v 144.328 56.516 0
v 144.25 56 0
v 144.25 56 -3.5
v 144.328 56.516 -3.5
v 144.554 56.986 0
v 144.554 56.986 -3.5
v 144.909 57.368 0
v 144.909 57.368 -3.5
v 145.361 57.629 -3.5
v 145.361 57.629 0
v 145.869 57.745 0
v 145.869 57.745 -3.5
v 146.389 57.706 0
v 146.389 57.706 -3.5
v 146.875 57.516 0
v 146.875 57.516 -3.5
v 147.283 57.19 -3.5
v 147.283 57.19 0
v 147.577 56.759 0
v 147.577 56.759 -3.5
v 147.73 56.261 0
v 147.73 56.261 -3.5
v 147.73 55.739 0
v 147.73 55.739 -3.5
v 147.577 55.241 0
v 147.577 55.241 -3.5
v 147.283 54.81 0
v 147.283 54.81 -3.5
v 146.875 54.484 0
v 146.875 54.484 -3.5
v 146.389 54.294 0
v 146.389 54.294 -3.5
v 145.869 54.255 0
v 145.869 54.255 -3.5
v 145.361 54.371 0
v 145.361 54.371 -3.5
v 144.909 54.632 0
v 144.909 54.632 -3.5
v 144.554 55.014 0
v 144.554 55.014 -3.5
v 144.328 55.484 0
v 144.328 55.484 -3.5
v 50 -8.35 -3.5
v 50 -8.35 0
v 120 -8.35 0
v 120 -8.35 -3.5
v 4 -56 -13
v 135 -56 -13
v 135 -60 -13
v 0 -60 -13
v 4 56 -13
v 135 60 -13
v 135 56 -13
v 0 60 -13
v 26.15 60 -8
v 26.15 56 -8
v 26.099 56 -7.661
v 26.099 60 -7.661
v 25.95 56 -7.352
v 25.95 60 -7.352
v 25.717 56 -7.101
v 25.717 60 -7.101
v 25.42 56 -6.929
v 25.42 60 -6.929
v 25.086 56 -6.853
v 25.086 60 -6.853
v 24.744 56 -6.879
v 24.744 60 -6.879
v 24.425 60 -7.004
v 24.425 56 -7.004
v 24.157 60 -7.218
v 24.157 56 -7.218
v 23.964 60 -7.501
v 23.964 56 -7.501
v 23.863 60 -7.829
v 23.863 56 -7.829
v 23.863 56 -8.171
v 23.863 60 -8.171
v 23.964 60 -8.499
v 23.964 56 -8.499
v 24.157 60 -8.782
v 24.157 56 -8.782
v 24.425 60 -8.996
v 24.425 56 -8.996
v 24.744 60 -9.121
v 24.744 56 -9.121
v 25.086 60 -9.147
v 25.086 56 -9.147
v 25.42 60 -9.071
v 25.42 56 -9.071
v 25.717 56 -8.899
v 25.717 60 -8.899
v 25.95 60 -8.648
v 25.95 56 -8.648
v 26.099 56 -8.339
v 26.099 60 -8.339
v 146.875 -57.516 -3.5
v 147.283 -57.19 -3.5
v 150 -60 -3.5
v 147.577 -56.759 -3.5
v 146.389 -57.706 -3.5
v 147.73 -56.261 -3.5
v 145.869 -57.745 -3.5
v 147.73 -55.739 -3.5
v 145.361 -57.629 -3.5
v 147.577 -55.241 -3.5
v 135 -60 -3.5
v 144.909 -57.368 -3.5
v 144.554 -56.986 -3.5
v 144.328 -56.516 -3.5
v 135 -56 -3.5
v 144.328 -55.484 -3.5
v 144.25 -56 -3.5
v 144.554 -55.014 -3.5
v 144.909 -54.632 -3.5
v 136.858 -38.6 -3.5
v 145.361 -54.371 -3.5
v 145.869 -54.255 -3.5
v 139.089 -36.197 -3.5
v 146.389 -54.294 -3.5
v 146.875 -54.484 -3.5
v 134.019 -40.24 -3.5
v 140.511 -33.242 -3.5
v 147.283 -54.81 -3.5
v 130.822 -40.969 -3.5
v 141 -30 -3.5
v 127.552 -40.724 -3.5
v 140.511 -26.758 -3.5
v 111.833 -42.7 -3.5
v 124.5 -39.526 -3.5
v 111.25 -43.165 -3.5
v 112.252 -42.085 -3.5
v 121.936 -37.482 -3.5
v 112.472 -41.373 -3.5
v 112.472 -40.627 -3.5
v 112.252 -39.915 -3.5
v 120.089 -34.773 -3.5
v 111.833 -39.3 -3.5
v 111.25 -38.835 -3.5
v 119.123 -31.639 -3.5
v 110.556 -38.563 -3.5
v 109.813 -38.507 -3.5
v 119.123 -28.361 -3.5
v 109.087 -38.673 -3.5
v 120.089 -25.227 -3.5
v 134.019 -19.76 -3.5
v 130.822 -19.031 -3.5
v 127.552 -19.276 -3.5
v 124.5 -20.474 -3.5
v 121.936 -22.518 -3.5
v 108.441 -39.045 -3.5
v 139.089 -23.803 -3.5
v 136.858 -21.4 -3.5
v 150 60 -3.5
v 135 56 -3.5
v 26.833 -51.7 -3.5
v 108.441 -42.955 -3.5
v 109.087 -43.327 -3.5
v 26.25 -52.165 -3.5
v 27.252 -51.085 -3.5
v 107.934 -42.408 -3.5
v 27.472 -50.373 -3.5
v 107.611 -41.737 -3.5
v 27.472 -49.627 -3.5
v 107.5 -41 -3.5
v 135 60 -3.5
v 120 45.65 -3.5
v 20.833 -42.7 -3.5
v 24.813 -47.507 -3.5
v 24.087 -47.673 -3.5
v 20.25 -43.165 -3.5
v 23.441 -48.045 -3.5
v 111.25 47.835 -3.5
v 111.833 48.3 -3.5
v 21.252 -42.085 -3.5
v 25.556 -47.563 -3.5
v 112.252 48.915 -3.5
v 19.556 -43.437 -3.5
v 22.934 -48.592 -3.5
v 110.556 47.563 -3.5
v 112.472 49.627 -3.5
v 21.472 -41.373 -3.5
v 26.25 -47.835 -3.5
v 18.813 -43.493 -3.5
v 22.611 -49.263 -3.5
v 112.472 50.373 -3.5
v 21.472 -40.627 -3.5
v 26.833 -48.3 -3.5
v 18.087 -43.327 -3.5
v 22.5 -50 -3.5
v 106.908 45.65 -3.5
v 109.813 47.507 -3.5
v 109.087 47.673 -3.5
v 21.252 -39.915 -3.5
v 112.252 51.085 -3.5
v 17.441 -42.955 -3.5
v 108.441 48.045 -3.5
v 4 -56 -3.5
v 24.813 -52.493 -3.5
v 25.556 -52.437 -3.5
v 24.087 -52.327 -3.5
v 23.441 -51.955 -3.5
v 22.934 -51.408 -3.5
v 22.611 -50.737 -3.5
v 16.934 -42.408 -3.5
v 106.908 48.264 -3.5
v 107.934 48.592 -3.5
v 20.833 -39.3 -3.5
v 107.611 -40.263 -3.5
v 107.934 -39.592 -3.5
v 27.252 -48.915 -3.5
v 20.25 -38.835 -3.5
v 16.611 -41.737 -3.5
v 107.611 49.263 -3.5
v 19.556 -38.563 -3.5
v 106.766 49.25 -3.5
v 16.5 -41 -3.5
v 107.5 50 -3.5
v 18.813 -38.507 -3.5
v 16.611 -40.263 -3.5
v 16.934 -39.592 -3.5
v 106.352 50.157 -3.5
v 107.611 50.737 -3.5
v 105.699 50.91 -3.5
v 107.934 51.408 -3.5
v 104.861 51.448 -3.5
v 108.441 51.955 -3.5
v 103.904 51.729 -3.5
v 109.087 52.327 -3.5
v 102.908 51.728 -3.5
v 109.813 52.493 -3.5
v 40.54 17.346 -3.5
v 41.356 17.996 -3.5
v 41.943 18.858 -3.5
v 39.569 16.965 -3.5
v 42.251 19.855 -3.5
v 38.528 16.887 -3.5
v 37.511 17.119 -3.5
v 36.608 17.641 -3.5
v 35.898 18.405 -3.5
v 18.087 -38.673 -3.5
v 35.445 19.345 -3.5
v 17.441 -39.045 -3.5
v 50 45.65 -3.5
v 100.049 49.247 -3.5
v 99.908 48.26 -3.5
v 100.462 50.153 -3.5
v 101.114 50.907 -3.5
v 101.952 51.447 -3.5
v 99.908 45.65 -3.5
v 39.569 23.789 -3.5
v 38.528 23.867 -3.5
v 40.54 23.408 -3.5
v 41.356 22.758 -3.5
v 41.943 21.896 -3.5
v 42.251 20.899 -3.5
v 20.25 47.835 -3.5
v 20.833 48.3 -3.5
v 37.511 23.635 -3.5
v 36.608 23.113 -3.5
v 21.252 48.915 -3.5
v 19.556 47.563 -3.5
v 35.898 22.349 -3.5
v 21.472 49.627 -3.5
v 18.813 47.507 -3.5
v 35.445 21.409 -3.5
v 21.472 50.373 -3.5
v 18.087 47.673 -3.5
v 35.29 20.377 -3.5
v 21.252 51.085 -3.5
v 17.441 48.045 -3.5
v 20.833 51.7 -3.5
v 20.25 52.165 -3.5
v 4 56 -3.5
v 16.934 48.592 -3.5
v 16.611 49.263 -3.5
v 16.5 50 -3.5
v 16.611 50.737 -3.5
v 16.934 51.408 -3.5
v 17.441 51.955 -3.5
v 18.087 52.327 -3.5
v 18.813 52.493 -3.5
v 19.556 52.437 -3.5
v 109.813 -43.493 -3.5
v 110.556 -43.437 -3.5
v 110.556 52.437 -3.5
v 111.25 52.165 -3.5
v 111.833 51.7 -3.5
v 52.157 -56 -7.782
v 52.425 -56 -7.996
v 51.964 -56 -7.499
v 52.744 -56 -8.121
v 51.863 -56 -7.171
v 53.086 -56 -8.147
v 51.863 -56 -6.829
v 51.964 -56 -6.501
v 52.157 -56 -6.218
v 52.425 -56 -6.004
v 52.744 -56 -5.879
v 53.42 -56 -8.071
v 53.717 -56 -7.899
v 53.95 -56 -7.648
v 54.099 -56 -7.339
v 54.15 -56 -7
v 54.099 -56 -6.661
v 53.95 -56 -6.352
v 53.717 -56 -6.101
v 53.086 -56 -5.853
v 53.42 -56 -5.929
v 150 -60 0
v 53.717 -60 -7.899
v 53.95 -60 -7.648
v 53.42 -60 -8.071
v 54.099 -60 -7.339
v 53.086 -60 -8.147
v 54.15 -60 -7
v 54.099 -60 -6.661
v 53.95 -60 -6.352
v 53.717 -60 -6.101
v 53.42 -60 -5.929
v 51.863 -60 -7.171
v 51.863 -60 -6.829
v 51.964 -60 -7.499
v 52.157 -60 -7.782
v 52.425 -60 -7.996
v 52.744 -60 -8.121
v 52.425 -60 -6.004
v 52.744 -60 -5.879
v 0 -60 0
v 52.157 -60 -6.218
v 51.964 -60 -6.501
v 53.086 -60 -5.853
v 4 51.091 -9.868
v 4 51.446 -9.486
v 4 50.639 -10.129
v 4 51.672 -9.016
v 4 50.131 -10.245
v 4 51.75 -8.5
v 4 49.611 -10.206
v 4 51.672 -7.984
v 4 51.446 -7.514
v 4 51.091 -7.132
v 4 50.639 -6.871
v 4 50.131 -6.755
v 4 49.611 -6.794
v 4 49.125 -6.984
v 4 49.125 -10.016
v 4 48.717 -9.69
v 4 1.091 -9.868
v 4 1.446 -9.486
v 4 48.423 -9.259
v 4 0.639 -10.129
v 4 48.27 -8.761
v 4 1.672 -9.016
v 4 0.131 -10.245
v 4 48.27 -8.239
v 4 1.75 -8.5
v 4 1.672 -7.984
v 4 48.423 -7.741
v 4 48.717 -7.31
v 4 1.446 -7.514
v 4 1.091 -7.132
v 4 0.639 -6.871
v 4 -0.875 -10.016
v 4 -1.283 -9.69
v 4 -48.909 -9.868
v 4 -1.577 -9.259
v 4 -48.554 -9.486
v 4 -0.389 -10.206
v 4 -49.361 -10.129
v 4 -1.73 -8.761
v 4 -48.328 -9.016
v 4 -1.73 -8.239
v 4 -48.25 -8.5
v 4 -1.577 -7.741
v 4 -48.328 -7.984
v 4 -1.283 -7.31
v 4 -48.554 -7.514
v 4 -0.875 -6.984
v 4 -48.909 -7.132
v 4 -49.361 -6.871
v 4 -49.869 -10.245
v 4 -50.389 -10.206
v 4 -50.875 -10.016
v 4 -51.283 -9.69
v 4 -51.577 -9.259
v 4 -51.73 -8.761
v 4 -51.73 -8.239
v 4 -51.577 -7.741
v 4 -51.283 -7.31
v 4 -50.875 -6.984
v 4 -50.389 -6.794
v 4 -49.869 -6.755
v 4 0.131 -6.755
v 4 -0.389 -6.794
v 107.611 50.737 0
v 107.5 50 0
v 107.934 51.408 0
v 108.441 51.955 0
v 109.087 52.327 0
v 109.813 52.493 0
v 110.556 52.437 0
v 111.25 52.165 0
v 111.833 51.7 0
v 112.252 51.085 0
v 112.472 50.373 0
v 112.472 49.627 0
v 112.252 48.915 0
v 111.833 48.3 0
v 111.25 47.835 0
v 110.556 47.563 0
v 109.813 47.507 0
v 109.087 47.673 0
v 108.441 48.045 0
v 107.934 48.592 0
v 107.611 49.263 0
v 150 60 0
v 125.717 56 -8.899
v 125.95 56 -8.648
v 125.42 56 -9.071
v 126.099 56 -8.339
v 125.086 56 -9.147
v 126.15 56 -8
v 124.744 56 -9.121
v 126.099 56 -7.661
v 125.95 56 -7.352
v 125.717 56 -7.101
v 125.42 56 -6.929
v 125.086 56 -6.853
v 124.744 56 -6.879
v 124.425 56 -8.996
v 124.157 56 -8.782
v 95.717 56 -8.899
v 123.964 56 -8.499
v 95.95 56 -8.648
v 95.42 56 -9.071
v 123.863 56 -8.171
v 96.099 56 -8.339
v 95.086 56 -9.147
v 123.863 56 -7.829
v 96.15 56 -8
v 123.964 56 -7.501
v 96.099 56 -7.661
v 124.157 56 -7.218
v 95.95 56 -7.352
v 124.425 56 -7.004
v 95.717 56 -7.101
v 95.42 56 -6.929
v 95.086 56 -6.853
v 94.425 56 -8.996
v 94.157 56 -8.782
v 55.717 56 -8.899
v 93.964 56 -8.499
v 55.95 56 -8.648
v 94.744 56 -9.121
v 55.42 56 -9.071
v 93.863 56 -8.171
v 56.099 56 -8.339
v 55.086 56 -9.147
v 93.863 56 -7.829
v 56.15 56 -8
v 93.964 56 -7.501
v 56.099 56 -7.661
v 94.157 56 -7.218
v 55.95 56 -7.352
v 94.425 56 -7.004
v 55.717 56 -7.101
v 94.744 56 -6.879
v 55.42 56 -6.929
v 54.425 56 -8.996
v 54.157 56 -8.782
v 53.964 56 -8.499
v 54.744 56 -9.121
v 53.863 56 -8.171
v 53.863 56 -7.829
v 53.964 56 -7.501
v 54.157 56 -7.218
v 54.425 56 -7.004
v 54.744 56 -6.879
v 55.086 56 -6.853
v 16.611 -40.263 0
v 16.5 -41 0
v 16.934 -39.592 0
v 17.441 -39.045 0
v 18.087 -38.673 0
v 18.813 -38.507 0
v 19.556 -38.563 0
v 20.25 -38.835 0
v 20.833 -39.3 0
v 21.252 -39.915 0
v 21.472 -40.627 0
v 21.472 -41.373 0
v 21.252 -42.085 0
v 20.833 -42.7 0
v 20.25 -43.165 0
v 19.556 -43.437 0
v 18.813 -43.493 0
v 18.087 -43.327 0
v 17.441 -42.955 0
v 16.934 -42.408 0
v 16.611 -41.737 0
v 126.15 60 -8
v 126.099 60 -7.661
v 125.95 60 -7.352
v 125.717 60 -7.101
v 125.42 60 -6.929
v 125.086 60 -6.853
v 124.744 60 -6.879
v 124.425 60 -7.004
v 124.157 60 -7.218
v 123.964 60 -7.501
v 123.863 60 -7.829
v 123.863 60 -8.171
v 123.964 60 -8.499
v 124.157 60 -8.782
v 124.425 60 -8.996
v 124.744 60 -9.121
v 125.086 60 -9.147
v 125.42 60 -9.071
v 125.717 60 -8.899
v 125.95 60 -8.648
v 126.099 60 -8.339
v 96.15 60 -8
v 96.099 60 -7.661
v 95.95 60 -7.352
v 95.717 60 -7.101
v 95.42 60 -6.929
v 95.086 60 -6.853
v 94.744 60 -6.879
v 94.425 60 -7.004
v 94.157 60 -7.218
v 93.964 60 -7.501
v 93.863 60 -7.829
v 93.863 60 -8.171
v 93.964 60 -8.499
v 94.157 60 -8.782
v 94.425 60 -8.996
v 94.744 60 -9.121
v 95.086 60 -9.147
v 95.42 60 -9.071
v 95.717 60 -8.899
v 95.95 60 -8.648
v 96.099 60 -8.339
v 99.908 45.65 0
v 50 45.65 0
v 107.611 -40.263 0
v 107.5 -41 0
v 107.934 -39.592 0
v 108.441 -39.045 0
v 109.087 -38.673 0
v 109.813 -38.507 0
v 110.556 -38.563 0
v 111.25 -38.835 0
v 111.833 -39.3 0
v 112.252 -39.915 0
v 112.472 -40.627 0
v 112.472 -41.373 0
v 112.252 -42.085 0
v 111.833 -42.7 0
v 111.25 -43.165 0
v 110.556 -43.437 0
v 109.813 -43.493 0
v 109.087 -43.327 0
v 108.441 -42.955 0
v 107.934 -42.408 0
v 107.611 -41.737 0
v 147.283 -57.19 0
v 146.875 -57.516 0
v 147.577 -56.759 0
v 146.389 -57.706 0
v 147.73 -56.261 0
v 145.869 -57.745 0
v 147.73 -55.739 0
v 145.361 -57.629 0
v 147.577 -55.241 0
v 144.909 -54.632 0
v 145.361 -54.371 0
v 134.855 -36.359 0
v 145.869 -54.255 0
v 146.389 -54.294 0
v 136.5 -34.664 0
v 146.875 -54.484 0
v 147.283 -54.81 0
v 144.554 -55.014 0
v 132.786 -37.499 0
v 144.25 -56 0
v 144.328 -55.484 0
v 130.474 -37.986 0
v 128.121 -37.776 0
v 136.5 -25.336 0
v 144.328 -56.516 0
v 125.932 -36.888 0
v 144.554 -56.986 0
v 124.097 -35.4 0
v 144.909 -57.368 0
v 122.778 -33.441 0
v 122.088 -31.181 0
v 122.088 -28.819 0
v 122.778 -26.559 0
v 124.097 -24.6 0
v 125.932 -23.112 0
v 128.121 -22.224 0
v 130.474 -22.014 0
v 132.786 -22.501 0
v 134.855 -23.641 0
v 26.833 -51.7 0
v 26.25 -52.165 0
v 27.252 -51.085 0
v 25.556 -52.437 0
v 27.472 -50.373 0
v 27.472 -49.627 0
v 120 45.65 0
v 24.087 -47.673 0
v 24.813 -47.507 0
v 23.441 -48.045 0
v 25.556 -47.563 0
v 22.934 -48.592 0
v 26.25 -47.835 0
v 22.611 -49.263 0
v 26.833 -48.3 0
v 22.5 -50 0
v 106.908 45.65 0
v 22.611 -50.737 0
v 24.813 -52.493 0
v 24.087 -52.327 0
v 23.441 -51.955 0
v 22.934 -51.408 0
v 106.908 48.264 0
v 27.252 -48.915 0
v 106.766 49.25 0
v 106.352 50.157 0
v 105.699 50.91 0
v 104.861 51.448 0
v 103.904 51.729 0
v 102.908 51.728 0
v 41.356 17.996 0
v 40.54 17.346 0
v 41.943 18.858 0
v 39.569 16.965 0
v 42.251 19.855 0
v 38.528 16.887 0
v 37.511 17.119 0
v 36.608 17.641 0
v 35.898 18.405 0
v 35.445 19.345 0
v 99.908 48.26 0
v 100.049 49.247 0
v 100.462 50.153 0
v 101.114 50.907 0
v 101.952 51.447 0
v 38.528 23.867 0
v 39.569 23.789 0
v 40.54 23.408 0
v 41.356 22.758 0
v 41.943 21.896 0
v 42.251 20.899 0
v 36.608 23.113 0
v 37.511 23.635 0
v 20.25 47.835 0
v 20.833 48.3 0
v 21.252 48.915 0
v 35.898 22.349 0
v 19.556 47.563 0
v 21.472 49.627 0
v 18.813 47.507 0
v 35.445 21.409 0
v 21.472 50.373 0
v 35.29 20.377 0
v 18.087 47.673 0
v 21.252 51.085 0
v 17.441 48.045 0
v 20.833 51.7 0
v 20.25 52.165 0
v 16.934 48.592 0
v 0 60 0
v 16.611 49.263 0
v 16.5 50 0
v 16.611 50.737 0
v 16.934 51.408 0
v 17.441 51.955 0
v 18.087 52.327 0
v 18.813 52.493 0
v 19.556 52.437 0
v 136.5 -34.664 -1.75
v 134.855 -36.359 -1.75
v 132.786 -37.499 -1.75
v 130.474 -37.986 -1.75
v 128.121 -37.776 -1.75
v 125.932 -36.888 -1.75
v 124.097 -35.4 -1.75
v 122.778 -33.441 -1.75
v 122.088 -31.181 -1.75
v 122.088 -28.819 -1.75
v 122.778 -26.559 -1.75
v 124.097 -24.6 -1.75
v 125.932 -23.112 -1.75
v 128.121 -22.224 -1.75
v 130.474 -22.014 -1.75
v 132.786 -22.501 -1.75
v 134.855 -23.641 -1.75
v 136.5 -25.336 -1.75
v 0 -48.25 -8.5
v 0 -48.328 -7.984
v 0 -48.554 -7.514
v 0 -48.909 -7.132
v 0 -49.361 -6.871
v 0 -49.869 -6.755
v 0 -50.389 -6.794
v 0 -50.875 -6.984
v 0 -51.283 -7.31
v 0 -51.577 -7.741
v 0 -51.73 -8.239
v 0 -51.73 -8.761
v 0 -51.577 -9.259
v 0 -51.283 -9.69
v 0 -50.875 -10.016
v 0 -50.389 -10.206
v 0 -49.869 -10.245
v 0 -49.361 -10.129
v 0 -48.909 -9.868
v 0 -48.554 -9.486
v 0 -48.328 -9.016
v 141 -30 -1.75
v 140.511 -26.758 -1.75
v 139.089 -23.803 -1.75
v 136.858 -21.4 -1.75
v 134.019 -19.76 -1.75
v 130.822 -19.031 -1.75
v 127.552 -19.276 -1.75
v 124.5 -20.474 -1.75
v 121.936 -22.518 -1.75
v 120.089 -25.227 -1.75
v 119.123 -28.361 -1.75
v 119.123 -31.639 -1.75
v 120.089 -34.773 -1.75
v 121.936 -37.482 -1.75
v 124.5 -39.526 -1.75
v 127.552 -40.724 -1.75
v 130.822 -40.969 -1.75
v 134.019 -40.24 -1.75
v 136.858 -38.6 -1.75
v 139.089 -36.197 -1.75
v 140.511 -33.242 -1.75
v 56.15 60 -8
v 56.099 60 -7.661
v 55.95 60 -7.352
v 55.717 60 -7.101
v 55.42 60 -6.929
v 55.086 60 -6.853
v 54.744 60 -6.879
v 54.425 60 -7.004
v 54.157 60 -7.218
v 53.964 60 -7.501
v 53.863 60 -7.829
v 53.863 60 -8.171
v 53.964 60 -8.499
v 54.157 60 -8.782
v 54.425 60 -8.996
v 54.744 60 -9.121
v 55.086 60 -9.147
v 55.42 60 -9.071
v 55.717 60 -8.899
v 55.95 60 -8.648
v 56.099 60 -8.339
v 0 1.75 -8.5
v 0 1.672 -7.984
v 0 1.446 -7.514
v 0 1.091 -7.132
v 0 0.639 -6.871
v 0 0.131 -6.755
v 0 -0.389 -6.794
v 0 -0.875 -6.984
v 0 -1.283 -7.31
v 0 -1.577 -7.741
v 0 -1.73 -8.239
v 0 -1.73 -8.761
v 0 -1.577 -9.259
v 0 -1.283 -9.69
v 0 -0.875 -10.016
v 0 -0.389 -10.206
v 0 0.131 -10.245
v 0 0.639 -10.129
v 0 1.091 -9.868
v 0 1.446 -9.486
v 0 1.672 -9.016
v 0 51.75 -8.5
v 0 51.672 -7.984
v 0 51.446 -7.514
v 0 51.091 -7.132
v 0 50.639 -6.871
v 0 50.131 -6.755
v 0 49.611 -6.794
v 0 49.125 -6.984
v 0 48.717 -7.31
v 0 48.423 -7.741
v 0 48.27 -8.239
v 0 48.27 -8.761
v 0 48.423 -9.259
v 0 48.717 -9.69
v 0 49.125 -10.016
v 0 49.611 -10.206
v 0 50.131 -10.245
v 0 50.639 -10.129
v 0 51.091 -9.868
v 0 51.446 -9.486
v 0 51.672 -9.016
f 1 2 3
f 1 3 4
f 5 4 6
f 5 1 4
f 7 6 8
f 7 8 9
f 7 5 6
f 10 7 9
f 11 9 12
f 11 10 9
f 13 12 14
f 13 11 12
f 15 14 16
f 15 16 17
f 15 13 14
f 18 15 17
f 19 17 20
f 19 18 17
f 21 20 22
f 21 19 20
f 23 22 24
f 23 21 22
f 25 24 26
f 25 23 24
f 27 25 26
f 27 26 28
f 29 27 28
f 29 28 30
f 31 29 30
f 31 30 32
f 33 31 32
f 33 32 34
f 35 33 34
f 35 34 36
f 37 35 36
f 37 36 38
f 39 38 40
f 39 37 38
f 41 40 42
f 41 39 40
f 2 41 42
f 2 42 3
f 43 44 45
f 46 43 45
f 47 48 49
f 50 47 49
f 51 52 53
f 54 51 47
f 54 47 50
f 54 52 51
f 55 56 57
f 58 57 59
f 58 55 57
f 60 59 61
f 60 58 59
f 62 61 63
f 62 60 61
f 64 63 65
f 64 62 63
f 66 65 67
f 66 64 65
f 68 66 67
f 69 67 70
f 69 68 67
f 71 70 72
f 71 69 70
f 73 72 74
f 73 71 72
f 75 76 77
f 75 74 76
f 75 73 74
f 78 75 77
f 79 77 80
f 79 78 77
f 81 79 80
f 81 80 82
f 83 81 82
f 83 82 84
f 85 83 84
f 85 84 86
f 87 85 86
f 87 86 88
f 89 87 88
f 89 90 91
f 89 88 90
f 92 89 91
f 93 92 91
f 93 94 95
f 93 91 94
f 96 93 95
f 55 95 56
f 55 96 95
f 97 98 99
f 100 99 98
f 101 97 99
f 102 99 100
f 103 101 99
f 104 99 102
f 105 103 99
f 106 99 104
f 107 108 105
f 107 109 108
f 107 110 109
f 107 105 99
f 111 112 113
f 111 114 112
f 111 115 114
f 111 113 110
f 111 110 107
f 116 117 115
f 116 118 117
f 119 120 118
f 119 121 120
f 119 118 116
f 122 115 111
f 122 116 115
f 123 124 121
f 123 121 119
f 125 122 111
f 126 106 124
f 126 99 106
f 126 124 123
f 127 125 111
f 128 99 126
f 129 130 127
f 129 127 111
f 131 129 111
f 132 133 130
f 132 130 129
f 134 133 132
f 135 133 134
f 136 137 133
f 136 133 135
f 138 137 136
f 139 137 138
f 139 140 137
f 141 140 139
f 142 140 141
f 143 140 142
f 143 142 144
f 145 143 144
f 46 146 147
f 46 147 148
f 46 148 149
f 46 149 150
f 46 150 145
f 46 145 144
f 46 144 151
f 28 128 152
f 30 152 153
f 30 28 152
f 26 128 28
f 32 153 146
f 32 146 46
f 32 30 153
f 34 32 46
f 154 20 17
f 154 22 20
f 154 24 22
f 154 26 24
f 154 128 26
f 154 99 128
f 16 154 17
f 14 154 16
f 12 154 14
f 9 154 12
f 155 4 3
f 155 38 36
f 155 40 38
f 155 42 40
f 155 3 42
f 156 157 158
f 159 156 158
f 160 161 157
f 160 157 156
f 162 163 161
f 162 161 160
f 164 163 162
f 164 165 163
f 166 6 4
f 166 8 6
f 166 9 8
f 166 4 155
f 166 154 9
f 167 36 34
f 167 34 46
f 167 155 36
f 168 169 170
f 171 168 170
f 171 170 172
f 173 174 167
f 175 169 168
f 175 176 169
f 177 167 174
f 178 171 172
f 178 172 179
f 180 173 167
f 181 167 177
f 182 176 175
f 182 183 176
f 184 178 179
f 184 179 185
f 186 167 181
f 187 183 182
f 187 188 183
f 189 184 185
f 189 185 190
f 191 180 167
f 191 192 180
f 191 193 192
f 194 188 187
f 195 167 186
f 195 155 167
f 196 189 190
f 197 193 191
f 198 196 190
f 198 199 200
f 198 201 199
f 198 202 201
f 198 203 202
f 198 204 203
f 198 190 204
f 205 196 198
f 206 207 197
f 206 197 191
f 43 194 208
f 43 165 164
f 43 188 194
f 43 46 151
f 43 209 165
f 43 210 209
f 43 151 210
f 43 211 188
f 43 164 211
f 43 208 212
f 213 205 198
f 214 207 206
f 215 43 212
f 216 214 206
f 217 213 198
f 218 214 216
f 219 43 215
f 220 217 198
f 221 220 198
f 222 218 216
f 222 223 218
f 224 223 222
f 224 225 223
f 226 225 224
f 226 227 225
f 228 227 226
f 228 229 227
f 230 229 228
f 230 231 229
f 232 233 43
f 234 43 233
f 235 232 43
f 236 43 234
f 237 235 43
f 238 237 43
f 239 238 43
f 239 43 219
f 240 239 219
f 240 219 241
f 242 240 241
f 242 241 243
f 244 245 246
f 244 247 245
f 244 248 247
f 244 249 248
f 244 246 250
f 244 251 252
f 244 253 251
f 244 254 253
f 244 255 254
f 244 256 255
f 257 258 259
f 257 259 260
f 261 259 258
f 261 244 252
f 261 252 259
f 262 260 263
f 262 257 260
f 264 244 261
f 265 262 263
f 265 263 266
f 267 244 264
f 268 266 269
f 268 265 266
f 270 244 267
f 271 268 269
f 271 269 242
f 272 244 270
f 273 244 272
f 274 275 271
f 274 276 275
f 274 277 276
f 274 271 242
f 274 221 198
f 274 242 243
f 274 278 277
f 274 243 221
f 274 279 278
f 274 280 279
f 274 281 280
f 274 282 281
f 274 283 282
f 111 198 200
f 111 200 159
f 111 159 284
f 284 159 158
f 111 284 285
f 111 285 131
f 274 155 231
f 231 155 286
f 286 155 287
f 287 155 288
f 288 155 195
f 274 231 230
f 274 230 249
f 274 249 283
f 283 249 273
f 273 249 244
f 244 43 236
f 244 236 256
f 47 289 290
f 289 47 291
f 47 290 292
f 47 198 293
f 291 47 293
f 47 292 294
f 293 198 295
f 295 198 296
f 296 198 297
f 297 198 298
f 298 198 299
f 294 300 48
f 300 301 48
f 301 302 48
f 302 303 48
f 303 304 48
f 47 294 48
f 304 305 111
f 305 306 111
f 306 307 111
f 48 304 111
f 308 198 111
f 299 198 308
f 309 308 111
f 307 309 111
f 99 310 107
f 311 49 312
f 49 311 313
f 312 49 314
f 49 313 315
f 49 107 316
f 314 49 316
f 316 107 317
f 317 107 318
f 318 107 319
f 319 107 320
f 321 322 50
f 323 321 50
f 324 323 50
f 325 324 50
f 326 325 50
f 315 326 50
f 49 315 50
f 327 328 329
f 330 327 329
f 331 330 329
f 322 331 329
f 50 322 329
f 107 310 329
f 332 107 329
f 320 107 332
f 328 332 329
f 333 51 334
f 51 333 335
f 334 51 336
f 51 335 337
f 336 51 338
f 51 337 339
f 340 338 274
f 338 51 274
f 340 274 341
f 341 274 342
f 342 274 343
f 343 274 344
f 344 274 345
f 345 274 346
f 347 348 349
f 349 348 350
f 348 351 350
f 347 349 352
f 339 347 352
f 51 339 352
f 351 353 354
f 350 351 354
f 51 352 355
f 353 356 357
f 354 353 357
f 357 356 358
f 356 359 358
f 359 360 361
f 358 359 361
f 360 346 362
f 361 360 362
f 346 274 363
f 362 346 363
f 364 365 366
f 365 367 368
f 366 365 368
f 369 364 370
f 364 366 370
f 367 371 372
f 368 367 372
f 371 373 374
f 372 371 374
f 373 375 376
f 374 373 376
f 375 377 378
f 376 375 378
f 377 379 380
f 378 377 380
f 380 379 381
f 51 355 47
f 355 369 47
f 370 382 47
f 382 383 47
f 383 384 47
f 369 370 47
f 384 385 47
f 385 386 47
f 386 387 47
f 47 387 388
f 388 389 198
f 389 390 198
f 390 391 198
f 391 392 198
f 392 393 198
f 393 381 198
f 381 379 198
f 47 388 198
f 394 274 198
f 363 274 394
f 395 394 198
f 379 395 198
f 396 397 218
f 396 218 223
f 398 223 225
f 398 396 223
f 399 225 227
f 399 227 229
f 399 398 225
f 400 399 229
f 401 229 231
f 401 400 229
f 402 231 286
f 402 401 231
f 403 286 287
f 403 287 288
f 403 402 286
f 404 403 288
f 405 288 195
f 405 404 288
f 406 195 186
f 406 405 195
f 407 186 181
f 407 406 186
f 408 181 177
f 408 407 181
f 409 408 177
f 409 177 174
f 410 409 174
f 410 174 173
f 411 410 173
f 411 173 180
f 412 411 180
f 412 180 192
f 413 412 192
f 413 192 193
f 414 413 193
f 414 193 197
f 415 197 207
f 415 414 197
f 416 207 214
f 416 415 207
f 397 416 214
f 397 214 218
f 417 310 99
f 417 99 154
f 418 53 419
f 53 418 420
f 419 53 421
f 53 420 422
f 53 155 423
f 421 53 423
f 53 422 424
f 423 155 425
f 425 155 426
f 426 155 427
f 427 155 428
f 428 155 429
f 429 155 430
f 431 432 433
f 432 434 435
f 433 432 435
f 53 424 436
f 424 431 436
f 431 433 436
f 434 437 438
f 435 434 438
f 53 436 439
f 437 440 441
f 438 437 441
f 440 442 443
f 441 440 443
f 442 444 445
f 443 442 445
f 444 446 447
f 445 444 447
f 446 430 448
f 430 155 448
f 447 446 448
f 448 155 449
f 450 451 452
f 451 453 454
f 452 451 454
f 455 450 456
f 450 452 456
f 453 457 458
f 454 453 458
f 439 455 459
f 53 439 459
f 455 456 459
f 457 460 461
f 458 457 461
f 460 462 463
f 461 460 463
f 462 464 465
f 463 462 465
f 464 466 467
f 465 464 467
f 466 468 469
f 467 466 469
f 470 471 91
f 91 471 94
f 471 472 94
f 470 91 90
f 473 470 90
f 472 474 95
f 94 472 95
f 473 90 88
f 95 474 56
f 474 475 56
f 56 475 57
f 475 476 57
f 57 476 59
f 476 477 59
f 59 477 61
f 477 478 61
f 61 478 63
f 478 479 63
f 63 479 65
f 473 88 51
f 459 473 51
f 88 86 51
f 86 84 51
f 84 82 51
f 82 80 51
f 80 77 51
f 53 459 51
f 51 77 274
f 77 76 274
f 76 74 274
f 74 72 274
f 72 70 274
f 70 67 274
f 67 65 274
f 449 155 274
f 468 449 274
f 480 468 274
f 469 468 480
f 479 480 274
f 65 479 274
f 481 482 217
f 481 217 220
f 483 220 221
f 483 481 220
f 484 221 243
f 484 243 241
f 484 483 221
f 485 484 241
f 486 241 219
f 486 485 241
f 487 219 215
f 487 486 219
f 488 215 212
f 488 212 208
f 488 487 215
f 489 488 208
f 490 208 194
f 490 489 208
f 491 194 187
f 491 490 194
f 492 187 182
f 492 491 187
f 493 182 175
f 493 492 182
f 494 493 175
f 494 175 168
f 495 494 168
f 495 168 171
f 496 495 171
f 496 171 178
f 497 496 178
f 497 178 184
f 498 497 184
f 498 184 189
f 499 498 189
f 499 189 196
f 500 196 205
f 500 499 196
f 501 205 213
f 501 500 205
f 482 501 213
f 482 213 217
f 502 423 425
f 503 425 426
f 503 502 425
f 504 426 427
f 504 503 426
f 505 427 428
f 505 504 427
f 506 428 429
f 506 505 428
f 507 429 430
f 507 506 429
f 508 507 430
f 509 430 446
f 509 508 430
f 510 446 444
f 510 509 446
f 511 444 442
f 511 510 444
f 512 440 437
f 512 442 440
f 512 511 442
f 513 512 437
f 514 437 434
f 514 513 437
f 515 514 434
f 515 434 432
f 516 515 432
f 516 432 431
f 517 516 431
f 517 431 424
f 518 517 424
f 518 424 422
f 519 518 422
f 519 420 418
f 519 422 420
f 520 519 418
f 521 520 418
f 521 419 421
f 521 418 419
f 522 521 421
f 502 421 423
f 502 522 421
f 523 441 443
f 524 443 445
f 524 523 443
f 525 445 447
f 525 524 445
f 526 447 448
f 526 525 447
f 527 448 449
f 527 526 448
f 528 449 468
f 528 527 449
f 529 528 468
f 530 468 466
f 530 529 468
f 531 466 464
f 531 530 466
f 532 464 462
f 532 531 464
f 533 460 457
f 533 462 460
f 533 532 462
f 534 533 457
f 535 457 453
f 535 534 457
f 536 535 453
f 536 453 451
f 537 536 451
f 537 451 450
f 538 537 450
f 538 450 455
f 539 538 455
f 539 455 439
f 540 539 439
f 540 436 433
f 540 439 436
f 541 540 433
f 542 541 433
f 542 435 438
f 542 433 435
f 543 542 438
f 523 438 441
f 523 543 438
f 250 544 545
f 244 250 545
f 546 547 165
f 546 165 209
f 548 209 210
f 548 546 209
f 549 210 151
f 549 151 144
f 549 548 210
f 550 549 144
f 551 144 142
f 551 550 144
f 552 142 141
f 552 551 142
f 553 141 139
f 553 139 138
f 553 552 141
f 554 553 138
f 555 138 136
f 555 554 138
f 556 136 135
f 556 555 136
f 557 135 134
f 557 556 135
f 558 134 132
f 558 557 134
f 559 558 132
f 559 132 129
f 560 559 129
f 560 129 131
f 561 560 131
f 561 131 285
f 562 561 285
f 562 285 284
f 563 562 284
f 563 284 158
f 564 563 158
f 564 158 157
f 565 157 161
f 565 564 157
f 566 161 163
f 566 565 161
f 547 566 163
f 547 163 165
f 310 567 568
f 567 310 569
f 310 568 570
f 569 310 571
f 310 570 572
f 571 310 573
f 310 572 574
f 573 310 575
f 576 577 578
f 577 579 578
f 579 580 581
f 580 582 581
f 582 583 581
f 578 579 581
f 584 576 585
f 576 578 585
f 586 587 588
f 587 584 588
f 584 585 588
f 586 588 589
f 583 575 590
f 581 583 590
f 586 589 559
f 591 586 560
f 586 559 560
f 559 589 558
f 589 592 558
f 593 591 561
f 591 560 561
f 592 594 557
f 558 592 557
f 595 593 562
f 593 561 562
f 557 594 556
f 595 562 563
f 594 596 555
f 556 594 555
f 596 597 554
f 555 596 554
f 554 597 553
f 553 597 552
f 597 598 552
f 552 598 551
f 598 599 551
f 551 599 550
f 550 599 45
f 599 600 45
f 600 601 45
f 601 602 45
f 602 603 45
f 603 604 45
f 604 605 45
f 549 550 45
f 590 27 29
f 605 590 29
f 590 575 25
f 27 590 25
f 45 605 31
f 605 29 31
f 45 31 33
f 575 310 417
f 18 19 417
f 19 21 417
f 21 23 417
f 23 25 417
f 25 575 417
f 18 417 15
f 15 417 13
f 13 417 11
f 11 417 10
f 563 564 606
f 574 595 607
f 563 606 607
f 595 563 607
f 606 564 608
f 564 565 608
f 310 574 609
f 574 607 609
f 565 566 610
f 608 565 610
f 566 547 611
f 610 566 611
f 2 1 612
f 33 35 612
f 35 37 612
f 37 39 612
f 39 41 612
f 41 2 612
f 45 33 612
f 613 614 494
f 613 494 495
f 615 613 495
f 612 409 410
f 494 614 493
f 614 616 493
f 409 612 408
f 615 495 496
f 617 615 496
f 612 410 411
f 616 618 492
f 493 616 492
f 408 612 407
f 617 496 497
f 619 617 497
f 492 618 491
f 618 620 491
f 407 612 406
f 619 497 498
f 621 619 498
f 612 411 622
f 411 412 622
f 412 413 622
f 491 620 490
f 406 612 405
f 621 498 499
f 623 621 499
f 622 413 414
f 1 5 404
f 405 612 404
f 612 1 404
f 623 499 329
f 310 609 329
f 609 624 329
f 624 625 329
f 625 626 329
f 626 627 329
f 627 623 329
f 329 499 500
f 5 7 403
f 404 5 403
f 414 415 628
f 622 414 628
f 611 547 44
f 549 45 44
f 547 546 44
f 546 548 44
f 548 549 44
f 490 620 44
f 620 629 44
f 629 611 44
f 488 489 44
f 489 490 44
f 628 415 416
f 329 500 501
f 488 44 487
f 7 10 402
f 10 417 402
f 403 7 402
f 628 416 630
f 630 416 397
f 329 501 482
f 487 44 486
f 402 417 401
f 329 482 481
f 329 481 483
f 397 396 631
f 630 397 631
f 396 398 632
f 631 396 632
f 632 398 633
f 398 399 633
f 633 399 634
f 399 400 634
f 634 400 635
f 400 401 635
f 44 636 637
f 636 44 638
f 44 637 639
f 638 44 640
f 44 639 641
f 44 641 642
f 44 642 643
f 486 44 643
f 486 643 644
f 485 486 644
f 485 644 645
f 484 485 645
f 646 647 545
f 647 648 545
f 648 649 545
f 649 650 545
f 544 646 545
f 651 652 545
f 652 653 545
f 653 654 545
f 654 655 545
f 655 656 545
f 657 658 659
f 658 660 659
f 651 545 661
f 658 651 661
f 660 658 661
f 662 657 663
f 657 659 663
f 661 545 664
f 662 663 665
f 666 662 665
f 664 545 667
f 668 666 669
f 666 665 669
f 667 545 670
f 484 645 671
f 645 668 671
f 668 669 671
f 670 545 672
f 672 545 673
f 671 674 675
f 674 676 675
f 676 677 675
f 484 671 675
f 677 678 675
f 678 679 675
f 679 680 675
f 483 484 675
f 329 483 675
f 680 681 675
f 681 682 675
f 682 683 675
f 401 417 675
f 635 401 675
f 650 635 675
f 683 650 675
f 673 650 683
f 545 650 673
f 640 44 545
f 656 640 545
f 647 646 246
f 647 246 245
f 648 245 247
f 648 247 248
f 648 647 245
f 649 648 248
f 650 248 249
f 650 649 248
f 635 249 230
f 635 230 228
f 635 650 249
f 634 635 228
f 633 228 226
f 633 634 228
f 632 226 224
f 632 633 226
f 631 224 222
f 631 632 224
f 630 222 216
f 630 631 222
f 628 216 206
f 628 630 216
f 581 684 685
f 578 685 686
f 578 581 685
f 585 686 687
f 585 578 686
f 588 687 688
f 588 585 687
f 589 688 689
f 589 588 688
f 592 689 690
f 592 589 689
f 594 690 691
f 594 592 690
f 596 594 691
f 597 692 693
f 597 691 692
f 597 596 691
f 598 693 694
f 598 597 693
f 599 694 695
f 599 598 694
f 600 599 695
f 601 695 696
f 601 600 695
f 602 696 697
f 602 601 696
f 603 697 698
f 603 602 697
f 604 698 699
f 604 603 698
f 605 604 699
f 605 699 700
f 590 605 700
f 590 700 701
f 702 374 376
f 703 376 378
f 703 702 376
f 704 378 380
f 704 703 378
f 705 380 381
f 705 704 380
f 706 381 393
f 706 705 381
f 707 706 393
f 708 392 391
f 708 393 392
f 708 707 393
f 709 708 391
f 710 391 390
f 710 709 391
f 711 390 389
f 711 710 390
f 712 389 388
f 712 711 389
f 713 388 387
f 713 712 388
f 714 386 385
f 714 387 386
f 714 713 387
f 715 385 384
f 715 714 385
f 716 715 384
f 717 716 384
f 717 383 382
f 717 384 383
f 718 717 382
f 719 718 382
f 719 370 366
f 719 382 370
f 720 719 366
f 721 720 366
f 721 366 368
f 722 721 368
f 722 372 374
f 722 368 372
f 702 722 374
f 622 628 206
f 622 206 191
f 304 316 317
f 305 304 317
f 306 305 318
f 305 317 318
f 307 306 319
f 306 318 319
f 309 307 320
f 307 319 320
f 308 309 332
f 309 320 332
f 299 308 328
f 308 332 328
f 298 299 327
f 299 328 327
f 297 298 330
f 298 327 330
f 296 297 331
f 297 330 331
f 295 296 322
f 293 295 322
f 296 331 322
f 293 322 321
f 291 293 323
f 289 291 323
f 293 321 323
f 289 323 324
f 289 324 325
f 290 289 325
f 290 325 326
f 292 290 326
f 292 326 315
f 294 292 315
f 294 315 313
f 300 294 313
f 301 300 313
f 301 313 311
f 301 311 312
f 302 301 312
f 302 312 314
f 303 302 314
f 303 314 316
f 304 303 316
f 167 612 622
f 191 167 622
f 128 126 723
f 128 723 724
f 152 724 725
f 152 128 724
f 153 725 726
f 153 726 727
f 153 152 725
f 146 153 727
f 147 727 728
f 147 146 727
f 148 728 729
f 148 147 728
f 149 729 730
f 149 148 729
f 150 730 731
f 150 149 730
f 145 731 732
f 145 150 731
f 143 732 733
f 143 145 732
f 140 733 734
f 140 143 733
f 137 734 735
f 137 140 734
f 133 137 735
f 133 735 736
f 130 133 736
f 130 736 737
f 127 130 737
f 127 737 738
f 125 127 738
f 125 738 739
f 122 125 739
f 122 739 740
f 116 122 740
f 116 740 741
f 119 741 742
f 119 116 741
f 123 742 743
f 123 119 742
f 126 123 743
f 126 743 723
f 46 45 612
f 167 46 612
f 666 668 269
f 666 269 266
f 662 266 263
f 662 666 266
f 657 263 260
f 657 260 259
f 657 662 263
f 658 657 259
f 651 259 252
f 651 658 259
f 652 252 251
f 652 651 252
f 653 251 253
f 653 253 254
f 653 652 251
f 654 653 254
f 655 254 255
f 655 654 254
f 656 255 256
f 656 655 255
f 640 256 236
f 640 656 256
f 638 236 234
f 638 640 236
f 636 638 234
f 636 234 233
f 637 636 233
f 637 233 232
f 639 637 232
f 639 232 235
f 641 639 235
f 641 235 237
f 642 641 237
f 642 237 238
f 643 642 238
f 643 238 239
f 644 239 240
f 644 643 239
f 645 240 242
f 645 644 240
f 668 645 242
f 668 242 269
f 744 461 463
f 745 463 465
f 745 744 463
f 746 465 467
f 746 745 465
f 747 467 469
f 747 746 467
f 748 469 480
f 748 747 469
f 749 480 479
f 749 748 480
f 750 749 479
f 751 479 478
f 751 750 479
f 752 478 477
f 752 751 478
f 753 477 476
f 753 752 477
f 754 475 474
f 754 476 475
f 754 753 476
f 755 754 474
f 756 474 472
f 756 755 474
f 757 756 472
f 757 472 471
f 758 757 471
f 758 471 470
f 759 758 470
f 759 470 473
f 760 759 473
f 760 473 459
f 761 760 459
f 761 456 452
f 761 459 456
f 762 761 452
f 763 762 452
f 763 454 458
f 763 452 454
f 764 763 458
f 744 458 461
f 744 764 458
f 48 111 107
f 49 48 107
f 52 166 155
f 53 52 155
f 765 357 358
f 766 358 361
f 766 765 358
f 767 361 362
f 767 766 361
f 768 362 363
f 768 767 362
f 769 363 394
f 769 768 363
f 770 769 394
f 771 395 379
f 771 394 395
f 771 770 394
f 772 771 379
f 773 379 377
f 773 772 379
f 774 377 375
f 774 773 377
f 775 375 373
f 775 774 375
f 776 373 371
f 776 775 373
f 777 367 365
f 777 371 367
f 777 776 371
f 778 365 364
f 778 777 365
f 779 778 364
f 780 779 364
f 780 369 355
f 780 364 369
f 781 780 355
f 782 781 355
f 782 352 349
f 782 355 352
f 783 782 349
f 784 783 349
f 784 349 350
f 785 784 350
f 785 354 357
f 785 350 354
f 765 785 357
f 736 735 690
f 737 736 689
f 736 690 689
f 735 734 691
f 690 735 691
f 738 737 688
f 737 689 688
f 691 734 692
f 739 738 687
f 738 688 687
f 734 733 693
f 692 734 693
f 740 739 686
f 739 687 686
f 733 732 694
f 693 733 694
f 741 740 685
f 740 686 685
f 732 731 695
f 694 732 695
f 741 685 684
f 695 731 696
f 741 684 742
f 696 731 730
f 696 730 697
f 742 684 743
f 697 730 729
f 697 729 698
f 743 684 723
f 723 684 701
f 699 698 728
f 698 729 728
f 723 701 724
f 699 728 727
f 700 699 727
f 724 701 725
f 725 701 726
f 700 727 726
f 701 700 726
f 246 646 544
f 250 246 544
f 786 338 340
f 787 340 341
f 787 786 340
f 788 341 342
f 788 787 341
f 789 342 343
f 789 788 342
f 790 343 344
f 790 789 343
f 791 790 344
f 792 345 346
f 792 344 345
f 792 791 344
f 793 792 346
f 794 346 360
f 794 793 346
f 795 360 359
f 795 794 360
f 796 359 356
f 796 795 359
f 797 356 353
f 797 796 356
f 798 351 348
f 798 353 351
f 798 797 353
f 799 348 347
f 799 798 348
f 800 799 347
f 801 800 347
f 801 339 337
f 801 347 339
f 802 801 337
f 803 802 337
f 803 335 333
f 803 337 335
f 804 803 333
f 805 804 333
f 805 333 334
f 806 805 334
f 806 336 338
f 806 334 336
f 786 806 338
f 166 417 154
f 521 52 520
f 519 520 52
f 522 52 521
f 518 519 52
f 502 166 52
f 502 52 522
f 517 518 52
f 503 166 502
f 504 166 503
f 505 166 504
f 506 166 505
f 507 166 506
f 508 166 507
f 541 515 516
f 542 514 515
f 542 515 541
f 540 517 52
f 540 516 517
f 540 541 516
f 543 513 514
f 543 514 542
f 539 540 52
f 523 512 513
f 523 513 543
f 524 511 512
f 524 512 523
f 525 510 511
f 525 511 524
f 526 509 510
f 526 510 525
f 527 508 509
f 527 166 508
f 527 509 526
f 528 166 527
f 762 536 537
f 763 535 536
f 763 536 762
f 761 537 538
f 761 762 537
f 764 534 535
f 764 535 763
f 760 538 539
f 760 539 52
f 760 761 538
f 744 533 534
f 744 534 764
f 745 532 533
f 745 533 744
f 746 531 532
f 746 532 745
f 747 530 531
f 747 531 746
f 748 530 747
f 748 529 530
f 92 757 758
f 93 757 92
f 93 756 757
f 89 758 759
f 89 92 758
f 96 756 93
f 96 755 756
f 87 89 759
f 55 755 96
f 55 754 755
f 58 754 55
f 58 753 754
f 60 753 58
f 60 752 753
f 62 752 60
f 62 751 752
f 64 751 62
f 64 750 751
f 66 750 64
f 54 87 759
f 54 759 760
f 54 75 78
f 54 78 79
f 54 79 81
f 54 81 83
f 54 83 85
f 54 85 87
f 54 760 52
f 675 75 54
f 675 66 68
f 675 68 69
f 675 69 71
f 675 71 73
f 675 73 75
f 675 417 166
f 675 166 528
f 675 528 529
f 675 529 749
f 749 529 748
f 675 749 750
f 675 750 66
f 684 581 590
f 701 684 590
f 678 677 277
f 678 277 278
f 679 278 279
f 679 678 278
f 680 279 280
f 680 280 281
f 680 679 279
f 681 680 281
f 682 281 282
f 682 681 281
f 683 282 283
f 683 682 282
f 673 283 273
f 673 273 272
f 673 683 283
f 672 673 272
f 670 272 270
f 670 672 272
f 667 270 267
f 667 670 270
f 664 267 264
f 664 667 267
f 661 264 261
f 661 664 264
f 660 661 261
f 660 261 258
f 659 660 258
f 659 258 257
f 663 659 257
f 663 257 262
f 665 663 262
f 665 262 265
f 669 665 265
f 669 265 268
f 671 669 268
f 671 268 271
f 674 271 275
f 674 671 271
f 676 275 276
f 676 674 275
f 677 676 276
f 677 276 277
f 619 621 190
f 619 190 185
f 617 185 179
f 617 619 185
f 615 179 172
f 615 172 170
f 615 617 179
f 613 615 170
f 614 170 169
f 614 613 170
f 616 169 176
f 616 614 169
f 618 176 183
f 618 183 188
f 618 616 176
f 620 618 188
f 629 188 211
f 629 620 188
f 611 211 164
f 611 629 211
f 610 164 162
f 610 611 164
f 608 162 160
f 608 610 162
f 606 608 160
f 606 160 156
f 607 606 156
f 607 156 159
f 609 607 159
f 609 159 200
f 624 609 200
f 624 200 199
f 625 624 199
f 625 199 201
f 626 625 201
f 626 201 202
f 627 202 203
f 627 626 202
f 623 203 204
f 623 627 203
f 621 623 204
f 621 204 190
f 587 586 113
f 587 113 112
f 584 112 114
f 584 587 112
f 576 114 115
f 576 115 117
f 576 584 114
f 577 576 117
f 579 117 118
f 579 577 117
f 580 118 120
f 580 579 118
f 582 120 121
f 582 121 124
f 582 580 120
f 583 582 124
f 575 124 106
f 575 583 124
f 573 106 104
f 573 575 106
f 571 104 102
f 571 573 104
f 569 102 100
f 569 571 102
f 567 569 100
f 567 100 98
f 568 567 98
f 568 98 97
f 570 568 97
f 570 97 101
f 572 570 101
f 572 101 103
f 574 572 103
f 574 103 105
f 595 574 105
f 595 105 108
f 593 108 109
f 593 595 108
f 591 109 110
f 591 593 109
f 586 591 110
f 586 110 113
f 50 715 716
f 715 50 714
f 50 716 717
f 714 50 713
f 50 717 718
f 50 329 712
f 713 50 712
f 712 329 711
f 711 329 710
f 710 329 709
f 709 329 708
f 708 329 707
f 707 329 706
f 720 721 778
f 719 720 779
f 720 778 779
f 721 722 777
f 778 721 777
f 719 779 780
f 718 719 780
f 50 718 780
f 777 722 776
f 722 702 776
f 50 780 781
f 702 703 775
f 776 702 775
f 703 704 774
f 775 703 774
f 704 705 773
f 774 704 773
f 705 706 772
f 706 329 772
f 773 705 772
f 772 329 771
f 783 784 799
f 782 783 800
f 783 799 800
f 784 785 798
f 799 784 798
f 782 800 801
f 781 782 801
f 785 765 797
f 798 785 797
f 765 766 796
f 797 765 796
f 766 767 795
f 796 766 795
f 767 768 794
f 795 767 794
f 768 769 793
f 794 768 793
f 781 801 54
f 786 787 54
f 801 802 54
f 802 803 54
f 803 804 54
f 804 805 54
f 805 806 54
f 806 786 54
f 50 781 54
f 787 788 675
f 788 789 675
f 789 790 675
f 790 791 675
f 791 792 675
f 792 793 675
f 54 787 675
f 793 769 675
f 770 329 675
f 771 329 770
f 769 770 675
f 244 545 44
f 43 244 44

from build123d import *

# Parameters (mm, degrees)
COPYSKETCH010_W   = 150
COPYSKETCH010_H   = 120
COPYSKETCH010_R   = 2.5
COPYSKETCH010_R_2 = 3.5
COPYSKETCH010_R_3 = 1.75
PAD_DEPTH         = 3.5
PAD001_DEPTH      = 13
SKETCH001_R       = 1.75
POCKET_DEPTH      = 5
SKETCH002_R       = 1.15
POCKET001_DEPTH   = 5
SKETCH003_R       = 1.15
POCKET002_DEPTH   = 5
SKETCH004_R       = 11
POCKET003_DEPTH   = 1.75


with BuildPart() as part:
    # CopySketch010 → Pad (new body)
    with BuildSketch(Plane(origin=(0, 0, 0), x_dir=(-1, 0, 0), z_dir=(0, 0, -1))):
        with Locations((-75, 0)):
            Rectangle(COPYSKETCH010_W, COPYSKETCH010_H)
        with Locations((-110, 50)):
            Circle(COPYSKETCH010_R, mode=Mode.SUBTRACT)
        with Locations((-110, -41)):
            Circle(COPYSKETCH010_R, mode=Mode.SUBTRACT)
        with Locations((-19, -41)):
            Circle(COPYSKETCH010_R, mode=Mode.SUBTRACT)
        with Locations((-19, 50)):
            Circle(COPYSKETCH010_R, mode=Mode.SUBTRACT)
        with Locations((-38.79, 20.377)):
            Circle(COPYSKETCH010_R_2, mode=Mode.SUBTRACT)
        with Locations((-146, 56)):
            Circle(COPYSKETCH010_R_3, mode=Mode.SUBTRACT)
        with Locations((-146, -56)):
            Circle(COPYSKETCH010_R_3, mode=Mode.SUBTRACT)
        with Locations((-25, -50)):
            Circle(COPYSKETCH010_R, mode=Mode.SUBTRACT)
        with BuildLine():
            Line((-50, -8.35), (-120, -8.35))
            Line((-120, -8.35), (-120, 45.65))
            Line((-120, 45.65), (-106.908, 45.65))
            Line((-106.908, 48.264), (-106.908, 45.65))
            ThreePointArc((-99.908002, 48.26), (-103.406, 51.763999), (-106.908, 48.264))
            Line((-99.908002, 48.26), (-99.908002, 45.65))
            Line((-99.908002, 45.65), (-50, 45.65))
            Line((-50, 45.65), (-50, -8.35))
        make_face(mode=Mode.SUBTRACT)
        with BuildLine():
            ThreePointArc((-136.5, -34.66369), (-122, -30), (-136.5, -25.33631))
            Line((-136.5, -34.66369), (-136.5, -25.33631))
        make_face(mode=Mode.SUBTRACT)
    extrude(amount=PAD_DEPTH)

    # Sketch (on Face23 of Pad) → Pad001 (join)
    with BuildSketch(Plane.XY):
        Polygon((135, 60), (135, 56), (4, 56), (4, -56), (135, -56), (135, -60), (0, -60), (0, 60), align=None)
    extrude(amount=-PAD001_DEPTH)

    # Sketch001 → Pocket (cut)
    with BuildSketch(Plane.YZ):
        with Locations((0, -8.5)):
            Circle(SKETCH001_R)
        with Locations((50, -8.5)):
            Circle(SKETCH001_R)
        with Locations((-50, -8.5)):
            Circle(SKETCH001_R)
    extrude(amount=POCKET_DEPTH, mode=Mode.SUBTRACT)

    # Sketch002 → Pocket001 (cut)
    with BuildSketch(Plane.XZ.offset(60)):
        with Locations((53, -7)):
            Circle(SKETCH002_R)
    extrude(amount=-POCKET001_DEPTH, mode=Mode.SUBTRACT)

    # Sketch003 → Pocket002 (cut)
    with BuildSketch(Plane.XZ.offset(-60)):
        with Locations((25, -8)):
            Circle(SKETCH003_R)
        with Locations((125, -8)):
            Circle(SKETCH003_R)
        with Locations((95, -8)):
            Circle(SKETCH003_R)
        with Locations((55, -8)):
            Circle(SKETCH003_R)
    extrude(amount=POCKET002_DEPTH, mode=Mode.SUBTRACT)

    # Sketch004 → Pocket003 (cut)
    with BuildSketch(Plane.XY.offset(-3.5)):
        with Locations((130, -30)):
            Circle(SKETCH004_R)
    extrude(amount=POCKET003_DEPTH, mode=Mode.SUBTRACT)


solid = part.part
